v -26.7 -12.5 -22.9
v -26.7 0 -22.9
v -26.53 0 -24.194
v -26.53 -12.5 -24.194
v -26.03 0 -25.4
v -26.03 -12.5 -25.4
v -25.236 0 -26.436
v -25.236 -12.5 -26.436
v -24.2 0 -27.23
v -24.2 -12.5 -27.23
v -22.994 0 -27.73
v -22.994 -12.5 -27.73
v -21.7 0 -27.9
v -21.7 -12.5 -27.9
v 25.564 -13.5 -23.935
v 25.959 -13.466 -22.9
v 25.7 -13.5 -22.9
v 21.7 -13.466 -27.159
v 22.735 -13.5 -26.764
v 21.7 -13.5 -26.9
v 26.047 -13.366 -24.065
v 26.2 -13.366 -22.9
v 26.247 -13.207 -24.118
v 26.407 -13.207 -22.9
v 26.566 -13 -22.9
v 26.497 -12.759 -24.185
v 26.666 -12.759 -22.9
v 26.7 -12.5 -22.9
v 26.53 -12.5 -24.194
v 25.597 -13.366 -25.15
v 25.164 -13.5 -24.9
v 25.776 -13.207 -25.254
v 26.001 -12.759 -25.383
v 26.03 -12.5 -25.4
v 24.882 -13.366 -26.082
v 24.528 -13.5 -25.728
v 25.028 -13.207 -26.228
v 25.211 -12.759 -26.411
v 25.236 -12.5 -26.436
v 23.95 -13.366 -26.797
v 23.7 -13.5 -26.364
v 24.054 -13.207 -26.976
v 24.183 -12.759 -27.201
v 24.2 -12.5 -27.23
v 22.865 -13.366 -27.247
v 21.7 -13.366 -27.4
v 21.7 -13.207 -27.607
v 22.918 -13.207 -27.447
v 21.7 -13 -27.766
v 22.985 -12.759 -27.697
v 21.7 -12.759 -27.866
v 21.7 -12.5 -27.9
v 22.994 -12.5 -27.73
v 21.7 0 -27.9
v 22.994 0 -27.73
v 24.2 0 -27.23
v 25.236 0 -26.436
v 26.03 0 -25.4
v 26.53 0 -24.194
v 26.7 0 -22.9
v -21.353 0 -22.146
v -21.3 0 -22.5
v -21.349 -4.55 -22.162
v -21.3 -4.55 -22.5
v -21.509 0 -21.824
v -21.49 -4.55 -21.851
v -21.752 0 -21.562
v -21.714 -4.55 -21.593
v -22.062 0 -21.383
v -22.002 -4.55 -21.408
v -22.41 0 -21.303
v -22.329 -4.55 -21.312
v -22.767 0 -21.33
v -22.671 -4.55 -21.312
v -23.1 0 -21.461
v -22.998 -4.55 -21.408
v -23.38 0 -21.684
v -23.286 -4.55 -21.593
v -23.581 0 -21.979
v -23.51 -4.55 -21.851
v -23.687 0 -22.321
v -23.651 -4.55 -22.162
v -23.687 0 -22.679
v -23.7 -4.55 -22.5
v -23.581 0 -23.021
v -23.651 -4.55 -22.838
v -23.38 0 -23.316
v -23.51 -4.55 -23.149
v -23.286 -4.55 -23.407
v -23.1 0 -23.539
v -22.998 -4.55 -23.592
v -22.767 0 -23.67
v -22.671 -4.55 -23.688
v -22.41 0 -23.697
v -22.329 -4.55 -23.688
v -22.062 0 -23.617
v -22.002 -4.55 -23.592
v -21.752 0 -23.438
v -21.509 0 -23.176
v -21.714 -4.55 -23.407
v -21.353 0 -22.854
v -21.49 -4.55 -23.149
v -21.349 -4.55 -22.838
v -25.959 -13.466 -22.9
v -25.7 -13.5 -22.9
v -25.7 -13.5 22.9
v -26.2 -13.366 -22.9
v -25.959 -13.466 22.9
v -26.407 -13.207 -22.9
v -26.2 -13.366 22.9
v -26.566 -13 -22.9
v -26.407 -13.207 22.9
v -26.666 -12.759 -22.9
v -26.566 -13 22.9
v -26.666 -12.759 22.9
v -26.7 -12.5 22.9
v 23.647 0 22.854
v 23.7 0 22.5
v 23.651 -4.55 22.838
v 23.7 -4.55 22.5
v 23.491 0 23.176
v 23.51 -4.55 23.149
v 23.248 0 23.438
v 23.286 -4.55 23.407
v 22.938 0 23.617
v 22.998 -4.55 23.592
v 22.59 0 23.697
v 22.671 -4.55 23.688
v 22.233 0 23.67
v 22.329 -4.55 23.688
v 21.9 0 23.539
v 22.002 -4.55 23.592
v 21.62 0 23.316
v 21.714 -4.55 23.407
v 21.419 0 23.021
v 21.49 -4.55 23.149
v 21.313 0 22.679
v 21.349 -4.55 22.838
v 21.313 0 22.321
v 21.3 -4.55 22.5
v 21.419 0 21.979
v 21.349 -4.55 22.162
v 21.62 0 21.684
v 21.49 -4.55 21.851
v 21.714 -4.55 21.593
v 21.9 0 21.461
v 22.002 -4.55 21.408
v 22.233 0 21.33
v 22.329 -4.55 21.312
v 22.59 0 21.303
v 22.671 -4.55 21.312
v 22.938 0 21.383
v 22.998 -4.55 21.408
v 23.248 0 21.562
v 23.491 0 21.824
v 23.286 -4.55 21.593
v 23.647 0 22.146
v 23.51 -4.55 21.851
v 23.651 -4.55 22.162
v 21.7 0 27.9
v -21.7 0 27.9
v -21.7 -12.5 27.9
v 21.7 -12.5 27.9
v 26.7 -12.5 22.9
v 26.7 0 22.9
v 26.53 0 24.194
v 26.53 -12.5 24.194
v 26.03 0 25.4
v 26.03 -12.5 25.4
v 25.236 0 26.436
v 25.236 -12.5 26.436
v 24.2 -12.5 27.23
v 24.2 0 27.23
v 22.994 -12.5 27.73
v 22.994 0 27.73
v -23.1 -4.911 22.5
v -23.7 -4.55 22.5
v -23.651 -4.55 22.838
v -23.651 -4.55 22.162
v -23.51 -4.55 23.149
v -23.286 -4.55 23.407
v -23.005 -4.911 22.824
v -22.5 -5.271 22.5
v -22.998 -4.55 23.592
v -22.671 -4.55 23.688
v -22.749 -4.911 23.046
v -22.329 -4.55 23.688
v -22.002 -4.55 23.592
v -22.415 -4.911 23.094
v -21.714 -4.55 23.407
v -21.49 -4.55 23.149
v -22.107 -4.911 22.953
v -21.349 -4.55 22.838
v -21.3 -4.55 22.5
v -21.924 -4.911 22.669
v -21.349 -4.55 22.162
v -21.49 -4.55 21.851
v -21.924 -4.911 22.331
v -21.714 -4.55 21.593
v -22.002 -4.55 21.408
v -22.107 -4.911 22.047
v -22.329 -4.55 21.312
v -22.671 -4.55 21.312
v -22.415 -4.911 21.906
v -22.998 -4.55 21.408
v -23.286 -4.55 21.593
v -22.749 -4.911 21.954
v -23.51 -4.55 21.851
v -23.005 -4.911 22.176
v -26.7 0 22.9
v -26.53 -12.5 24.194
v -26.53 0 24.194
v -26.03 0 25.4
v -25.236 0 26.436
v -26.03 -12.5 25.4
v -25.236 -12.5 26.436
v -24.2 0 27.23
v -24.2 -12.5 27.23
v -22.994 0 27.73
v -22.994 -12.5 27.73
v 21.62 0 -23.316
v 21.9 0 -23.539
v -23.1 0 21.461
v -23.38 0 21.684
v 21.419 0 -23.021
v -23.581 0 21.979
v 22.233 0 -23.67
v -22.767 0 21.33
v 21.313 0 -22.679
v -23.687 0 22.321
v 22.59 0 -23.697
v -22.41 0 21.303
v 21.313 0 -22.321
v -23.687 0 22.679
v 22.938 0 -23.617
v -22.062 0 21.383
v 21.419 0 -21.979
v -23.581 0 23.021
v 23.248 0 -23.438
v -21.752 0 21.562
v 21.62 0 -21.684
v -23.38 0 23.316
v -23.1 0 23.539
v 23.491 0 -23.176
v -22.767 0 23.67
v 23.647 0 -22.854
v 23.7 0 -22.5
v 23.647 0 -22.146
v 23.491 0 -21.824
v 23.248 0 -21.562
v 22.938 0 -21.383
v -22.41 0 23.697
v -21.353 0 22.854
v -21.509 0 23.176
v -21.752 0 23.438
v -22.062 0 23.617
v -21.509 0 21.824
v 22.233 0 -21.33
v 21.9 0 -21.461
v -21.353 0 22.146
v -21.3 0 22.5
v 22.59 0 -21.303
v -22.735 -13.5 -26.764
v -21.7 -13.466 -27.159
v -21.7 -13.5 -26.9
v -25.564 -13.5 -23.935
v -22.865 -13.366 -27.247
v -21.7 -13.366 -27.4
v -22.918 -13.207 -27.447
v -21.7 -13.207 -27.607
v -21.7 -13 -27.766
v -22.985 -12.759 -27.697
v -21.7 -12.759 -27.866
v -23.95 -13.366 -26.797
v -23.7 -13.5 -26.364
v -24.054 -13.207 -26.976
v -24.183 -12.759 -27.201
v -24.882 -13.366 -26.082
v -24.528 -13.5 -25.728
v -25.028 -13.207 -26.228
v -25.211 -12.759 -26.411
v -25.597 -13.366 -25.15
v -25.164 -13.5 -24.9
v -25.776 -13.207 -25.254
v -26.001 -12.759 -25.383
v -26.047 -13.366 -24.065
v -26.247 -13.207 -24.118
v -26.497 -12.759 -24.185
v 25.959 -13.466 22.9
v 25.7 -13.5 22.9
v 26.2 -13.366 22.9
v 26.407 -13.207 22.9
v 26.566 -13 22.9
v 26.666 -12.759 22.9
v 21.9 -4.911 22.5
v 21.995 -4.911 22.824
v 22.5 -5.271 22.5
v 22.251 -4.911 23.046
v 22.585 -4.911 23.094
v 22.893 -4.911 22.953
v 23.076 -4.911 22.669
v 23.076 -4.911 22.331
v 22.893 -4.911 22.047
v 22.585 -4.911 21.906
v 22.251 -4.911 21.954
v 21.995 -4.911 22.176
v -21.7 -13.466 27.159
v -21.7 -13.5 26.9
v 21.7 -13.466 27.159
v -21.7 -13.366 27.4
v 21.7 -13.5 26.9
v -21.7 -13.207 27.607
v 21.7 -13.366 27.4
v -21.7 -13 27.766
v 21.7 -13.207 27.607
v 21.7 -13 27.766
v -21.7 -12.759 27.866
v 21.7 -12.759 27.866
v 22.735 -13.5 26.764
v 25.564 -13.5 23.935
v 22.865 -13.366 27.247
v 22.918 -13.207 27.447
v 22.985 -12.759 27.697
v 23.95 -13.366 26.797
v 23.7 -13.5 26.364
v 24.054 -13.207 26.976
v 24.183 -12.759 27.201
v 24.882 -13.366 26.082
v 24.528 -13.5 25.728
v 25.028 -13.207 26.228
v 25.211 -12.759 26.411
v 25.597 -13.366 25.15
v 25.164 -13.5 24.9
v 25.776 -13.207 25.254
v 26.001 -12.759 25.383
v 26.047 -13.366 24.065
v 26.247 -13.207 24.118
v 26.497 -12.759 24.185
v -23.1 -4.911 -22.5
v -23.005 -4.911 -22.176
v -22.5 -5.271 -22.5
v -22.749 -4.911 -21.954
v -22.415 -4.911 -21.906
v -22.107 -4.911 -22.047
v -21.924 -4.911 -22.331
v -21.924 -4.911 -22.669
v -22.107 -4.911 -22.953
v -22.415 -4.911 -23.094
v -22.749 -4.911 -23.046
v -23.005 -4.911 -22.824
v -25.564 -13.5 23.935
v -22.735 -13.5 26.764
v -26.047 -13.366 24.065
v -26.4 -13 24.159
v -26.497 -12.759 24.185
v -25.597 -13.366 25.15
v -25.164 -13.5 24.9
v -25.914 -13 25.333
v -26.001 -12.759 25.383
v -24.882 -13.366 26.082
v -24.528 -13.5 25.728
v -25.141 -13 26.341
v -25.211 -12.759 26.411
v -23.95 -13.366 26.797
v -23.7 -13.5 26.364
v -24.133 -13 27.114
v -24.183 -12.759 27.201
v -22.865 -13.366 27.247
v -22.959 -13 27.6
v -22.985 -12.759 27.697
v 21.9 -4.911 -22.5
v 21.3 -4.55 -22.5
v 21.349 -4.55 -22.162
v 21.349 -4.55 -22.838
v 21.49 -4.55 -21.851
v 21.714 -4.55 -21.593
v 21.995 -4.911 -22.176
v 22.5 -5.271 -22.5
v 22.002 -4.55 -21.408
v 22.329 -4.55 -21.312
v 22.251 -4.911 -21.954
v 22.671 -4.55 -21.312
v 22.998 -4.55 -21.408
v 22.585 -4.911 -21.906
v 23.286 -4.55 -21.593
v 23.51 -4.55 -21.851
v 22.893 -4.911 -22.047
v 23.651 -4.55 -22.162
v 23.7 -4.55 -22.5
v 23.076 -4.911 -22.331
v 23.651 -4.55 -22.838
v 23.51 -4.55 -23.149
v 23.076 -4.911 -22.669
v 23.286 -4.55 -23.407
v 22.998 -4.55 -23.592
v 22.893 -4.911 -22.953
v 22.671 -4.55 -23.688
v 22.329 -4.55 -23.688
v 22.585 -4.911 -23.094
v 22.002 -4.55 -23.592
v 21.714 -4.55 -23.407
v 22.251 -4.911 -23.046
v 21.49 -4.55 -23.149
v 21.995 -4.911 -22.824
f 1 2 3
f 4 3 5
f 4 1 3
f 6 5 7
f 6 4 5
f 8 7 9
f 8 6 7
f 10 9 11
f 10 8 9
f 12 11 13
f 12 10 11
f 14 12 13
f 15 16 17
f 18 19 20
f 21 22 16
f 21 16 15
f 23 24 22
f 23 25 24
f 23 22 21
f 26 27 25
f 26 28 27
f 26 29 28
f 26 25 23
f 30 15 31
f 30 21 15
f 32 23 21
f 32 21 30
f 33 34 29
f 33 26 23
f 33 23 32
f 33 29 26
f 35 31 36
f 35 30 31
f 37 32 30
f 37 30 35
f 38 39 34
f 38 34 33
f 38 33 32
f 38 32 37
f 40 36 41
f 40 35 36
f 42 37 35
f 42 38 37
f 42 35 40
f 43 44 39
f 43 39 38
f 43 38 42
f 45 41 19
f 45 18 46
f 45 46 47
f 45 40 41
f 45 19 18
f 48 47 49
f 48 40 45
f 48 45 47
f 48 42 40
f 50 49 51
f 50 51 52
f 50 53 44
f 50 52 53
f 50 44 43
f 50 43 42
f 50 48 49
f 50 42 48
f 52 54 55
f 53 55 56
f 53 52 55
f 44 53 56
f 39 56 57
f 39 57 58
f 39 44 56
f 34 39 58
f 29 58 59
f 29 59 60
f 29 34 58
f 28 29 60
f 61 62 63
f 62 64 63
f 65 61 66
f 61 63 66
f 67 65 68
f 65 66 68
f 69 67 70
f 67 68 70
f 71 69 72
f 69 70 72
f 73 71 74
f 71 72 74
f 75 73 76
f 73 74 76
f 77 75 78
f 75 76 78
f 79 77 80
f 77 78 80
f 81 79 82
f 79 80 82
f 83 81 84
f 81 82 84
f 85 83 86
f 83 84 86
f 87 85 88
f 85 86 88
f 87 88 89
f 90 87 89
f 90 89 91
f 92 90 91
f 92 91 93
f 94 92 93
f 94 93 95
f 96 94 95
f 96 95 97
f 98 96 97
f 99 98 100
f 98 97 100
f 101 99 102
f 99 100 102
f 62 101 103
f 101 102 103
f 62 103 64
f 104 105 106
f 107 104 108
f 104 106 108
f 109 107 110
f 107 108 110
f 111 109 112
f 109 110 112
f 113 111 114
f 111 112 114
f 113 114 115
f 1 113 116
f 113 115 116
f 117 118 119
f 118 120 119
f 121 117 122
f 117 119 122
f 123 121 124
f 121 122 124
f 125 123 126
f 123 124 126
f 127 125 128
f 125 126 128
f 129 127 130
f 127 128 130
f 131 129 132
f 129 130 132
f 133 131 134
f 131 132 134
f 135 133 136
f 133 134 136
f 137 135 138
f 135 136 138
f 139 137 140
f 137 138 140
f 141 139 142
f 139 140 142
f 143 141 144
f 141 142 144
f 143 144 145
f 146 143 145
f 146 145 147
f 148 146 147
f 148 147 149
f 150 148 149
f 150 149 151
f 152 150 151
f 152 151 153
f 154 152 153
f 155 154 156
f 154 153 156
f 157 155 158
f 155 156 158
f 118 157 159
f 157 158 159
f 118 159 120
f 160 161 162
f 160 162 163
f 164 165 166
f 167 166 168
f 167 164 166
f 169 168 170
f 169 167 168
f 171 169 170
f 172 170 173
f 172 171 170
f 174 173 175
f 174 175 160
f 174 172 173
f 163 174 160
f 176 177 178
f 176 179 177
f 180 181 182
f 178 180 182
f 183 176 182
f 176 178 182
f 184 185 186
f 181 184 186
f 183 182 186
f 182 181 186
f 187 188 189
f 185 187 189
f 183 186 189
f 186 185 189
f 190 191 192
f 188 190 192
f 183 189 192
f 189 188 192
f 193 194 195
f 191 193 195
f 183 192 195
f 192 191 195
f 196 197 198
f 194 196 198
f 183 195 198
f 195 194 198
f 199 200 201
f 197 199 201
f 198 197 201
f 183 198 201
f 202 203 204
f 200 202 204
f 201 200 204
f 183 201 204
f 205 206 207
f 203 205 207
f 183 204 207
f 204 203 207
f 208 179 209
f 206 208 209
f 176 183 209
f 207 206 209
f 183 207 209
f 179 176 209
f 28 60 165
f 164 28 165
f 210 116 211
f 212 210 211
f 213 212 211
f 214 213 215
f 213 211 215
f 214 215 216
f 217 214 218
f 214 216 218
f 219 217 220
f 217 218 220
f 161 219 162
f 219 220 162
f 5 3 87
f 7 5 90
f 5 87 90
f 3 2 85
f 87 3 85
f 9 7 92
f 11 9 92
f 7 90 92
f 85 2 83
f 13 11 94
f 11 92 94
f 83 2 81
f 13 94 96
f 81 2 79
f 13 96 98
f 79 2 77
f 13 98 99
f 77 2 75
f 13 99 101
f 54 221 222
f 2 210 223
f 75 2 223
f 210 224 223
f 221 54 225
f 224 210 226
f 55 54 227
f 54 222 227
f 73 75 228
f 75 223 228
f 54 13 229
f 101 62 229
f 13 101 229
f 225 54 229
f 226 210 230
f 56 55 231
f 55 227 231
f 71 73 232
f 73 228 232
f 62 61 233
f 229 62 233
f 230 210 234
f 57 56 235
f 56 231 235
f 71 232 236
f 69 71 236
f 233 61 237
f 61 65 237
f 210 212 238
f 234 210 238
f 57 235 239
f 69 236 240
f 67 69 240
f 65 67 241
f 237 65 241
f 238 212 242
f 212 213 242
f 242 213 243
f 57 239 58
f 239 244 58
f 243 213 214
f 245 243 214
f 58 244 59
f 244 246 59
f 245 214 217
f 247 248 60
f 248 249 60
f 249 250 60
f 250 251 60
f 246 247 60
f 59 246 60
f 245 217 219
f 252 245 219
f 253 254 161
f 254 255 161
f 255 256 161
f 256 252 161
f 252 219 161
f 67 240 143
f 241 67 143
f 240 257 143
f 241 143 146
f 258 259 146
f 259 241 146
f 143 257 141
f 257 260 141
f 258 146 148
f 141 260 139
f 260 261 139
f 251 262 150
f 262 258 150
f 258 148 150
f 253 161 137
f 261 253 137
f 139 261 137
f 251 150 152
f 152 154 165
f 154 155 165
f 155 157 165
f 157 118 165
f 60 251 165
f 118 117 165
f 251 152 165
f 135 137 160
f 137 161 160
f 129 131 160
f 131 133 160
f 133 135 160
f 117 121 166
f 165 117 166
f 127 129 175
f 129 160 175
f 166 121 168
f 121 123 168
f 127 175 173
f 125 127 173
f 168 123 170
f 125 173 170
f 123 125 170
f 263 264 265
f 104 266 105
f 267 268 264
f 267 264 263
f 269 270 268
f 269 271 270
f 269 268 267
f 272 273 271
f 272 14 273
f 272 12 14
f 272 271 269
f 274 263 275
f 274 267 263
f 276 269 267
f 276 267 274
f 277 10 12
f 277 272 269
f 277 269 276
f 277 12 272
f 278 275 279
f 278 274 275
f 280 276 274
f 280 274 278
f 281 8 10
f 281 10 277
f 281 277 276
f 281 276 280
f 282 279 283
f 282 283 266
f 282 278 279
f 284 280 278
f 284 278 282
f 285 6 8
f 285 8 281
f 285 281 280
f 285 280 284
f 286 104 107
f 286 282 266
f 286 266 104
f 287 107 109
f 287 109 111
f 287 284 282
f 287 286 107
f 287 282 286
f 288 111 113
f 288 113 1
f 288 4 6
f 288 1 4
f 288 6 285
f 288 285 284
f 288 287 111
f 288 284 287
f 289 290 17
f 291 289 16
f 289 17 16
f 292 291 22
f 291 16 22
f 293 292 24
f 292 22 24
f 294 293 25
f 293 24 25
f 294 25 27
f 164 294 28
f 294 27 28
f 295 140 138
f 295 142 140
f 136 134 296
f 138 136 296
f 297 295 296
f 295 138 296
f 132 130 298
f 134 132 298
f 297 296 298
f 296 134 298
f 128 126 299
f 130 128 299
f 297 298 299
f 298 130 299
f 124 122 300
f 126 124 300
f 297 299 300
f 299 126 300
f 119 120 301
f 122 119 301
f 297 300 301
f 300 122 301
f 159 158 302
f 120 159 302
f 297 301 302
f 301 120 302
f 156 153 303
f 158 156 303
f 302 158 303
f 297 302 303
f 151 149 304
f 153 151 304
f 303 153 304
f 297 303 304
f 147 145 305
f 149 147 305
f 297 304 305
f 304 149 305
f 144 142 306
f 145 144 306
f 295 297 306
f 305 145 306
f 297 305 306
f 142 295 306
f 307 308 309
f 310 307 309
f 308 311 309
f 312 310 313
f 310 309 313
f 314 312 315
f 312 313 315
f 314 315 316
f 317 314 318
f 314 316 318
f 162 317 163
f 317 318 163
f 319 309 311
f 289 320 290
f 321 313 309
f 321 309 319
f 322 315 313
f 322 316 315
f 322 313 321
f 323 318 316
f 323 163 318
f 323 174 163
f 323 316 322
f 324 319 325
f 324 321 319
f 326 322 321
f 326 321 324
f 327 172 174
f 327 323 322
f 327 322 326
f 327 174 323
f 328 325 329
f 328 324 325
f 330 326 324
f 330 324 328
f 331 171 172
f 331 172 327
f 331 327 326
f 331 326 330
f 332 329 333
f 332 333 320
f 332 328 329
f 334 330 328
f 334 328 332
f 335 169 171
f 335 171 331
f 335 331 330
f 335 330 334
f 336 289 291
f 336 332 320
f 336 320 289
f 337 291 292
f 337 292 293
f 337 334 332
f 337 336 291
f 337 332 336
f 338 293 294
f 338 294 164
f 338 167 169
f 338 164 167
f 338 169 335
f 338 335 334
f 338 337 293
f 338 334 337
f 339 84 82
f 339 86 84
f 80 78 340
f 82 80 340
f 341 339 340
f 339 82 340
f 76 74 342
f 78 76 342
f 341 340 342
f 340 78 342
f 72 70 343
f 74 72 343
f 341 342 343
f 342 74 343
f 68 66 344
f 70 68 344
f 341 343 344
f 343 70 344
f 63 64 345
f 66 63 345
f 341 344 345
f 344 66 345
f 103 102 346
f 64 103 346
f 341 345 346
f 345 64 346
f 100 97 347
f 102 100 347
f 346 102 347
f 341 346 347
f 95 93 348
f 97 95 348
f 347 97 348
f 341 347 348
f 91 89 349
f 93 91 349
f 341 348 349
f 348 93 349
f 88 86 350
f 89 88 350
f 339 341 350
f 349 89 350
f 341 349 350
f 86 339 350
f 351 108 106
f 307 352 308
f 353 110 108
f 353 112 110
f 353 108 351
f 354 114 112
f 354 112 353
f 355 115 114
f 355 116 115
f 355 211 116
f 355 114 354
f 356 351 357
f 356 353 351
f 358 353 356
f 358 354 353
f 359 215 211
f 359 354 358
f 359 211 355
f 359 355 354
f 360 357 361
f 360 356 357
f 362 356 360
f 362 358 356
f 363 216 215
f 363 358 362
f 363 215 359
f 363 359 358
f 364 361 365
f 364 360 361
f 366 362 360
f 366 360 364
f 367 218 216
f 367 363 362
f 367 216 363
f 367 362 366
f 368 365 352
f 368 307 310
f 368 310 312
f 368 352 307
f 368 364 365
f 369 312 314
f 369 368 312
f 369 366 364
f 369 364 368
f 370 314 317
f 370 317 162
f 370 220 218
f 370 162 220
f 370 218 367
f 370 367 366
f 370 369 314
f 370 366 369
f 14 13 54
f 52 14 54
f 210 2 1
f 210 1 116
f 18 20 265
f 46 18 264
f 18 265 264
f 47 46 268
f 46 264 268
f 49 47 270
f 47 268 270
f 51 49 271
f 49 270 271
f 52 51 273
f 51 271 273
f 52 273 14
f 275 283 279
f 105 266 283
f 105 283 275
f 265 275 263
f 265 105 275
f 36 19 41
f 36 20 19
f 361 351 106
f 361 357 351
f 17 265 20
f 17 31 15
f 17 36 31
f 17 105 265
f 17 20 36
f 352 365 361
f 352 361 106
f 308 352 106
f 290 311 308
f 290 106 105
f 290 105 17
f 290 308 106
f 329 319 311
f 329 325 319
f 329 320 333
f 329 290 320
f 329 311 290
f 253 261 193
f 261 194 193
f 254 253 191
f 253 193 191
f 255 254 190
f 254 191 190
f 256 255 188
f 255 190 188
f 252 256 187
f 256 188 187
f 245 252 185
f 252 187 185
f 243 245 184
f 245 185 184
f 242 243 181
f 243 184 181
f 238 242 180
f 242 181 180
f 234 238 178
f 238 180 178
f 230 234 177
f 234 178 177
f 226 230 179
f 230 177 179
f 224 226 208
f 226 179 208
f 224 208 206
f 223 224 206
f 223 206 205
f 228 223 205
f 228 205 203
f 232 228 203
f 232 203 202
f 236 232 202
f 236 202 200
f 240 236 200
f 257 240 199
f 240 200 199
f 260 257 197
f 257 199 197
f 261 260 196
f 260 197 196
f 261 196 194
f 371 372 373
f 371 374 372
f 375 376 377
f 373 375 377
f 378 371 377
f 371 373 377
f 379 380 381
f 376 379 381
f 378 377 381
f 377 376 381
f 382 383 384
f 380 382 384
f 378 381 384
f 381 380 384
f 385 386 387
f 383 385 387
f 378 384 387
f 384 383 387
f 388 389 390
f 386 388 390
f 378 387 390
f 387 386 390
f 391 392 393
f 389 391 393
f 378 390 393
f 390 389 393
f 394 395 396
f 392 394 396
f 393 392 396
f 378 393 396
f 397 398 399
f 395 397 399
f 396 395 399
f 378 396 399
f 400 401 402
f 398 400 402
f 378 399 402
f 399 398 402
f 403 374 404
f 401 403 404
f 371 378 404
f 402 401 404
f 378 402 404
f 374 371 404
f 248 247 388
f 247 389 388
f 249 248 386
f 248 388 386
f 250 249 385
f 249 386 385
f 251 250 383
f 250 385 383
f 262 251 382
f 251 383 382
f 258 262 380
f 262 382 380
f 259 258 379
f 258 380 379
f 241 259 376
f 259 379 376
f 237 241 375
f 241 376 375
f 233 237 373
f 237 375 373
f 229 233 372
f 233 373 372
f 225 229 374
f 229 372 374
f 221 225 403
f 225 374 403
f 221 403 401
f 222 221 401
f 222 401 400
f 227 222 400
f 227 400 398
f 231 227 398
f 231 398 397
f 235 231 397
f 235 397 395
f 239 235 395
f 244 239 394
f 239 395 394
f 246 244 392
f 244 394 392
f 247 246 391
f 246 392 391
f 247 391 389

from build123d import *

# Parameters (mm, degrees)
F0_W     = 53.4
F0_H     = 55.8
F1_DEPTH = 13.5
F2_R     = 5
F3_R     = 1
F5_D     = 2.4
F5_DEPTH = 4.55
F5_TIP   = 0.7210327428


with BuildPart() as f1:
    # F0 (on Front) → F1 (new body)
    with BuildSketch(Plane.XZ):
        Rectangle(F0_W, F0_H)
    extrude(amount=F1_DEPTH)

    # F2
    f2_edges = [f1.edges().sort_by_distance(p)[0] for p in [
        (-26.7, -6.75, 27.9),
        (26.7, -6.75, 27.9),
        (26.7, -6.75, -27.9),
        (-26.7, -6.75, -27.9),
    ]]
    fillet(f2_edges, radius=F2_R)

    # F3
    f3_edges = [f1.edges().sort_by_distance(p)[0] for p in [
        (0, -13.5, 27.9),
    ]]
    fillet(f3_edges, radius=F3_R)

    # F5
    with Locations(Plane(origin=(0, 0, 0), x_dir=(-1, 0, 0), z_dir=(0, 1, 0))):
        with Locations((-22.5, 22.5), (22.5, 22.5), (22.5, -22.5), (-22.5, -22.5)):
            Hole(F5_D / 2, depth=F5_DEPTH)
            with Locations((0, 0, -(F5_DEPTH + F5_TIP / 2))):  # 118° drill point
                Cone(0, F5_D / 2, F5_TIP, mode=Mode.SUBTRACT)


solid = f1.part
